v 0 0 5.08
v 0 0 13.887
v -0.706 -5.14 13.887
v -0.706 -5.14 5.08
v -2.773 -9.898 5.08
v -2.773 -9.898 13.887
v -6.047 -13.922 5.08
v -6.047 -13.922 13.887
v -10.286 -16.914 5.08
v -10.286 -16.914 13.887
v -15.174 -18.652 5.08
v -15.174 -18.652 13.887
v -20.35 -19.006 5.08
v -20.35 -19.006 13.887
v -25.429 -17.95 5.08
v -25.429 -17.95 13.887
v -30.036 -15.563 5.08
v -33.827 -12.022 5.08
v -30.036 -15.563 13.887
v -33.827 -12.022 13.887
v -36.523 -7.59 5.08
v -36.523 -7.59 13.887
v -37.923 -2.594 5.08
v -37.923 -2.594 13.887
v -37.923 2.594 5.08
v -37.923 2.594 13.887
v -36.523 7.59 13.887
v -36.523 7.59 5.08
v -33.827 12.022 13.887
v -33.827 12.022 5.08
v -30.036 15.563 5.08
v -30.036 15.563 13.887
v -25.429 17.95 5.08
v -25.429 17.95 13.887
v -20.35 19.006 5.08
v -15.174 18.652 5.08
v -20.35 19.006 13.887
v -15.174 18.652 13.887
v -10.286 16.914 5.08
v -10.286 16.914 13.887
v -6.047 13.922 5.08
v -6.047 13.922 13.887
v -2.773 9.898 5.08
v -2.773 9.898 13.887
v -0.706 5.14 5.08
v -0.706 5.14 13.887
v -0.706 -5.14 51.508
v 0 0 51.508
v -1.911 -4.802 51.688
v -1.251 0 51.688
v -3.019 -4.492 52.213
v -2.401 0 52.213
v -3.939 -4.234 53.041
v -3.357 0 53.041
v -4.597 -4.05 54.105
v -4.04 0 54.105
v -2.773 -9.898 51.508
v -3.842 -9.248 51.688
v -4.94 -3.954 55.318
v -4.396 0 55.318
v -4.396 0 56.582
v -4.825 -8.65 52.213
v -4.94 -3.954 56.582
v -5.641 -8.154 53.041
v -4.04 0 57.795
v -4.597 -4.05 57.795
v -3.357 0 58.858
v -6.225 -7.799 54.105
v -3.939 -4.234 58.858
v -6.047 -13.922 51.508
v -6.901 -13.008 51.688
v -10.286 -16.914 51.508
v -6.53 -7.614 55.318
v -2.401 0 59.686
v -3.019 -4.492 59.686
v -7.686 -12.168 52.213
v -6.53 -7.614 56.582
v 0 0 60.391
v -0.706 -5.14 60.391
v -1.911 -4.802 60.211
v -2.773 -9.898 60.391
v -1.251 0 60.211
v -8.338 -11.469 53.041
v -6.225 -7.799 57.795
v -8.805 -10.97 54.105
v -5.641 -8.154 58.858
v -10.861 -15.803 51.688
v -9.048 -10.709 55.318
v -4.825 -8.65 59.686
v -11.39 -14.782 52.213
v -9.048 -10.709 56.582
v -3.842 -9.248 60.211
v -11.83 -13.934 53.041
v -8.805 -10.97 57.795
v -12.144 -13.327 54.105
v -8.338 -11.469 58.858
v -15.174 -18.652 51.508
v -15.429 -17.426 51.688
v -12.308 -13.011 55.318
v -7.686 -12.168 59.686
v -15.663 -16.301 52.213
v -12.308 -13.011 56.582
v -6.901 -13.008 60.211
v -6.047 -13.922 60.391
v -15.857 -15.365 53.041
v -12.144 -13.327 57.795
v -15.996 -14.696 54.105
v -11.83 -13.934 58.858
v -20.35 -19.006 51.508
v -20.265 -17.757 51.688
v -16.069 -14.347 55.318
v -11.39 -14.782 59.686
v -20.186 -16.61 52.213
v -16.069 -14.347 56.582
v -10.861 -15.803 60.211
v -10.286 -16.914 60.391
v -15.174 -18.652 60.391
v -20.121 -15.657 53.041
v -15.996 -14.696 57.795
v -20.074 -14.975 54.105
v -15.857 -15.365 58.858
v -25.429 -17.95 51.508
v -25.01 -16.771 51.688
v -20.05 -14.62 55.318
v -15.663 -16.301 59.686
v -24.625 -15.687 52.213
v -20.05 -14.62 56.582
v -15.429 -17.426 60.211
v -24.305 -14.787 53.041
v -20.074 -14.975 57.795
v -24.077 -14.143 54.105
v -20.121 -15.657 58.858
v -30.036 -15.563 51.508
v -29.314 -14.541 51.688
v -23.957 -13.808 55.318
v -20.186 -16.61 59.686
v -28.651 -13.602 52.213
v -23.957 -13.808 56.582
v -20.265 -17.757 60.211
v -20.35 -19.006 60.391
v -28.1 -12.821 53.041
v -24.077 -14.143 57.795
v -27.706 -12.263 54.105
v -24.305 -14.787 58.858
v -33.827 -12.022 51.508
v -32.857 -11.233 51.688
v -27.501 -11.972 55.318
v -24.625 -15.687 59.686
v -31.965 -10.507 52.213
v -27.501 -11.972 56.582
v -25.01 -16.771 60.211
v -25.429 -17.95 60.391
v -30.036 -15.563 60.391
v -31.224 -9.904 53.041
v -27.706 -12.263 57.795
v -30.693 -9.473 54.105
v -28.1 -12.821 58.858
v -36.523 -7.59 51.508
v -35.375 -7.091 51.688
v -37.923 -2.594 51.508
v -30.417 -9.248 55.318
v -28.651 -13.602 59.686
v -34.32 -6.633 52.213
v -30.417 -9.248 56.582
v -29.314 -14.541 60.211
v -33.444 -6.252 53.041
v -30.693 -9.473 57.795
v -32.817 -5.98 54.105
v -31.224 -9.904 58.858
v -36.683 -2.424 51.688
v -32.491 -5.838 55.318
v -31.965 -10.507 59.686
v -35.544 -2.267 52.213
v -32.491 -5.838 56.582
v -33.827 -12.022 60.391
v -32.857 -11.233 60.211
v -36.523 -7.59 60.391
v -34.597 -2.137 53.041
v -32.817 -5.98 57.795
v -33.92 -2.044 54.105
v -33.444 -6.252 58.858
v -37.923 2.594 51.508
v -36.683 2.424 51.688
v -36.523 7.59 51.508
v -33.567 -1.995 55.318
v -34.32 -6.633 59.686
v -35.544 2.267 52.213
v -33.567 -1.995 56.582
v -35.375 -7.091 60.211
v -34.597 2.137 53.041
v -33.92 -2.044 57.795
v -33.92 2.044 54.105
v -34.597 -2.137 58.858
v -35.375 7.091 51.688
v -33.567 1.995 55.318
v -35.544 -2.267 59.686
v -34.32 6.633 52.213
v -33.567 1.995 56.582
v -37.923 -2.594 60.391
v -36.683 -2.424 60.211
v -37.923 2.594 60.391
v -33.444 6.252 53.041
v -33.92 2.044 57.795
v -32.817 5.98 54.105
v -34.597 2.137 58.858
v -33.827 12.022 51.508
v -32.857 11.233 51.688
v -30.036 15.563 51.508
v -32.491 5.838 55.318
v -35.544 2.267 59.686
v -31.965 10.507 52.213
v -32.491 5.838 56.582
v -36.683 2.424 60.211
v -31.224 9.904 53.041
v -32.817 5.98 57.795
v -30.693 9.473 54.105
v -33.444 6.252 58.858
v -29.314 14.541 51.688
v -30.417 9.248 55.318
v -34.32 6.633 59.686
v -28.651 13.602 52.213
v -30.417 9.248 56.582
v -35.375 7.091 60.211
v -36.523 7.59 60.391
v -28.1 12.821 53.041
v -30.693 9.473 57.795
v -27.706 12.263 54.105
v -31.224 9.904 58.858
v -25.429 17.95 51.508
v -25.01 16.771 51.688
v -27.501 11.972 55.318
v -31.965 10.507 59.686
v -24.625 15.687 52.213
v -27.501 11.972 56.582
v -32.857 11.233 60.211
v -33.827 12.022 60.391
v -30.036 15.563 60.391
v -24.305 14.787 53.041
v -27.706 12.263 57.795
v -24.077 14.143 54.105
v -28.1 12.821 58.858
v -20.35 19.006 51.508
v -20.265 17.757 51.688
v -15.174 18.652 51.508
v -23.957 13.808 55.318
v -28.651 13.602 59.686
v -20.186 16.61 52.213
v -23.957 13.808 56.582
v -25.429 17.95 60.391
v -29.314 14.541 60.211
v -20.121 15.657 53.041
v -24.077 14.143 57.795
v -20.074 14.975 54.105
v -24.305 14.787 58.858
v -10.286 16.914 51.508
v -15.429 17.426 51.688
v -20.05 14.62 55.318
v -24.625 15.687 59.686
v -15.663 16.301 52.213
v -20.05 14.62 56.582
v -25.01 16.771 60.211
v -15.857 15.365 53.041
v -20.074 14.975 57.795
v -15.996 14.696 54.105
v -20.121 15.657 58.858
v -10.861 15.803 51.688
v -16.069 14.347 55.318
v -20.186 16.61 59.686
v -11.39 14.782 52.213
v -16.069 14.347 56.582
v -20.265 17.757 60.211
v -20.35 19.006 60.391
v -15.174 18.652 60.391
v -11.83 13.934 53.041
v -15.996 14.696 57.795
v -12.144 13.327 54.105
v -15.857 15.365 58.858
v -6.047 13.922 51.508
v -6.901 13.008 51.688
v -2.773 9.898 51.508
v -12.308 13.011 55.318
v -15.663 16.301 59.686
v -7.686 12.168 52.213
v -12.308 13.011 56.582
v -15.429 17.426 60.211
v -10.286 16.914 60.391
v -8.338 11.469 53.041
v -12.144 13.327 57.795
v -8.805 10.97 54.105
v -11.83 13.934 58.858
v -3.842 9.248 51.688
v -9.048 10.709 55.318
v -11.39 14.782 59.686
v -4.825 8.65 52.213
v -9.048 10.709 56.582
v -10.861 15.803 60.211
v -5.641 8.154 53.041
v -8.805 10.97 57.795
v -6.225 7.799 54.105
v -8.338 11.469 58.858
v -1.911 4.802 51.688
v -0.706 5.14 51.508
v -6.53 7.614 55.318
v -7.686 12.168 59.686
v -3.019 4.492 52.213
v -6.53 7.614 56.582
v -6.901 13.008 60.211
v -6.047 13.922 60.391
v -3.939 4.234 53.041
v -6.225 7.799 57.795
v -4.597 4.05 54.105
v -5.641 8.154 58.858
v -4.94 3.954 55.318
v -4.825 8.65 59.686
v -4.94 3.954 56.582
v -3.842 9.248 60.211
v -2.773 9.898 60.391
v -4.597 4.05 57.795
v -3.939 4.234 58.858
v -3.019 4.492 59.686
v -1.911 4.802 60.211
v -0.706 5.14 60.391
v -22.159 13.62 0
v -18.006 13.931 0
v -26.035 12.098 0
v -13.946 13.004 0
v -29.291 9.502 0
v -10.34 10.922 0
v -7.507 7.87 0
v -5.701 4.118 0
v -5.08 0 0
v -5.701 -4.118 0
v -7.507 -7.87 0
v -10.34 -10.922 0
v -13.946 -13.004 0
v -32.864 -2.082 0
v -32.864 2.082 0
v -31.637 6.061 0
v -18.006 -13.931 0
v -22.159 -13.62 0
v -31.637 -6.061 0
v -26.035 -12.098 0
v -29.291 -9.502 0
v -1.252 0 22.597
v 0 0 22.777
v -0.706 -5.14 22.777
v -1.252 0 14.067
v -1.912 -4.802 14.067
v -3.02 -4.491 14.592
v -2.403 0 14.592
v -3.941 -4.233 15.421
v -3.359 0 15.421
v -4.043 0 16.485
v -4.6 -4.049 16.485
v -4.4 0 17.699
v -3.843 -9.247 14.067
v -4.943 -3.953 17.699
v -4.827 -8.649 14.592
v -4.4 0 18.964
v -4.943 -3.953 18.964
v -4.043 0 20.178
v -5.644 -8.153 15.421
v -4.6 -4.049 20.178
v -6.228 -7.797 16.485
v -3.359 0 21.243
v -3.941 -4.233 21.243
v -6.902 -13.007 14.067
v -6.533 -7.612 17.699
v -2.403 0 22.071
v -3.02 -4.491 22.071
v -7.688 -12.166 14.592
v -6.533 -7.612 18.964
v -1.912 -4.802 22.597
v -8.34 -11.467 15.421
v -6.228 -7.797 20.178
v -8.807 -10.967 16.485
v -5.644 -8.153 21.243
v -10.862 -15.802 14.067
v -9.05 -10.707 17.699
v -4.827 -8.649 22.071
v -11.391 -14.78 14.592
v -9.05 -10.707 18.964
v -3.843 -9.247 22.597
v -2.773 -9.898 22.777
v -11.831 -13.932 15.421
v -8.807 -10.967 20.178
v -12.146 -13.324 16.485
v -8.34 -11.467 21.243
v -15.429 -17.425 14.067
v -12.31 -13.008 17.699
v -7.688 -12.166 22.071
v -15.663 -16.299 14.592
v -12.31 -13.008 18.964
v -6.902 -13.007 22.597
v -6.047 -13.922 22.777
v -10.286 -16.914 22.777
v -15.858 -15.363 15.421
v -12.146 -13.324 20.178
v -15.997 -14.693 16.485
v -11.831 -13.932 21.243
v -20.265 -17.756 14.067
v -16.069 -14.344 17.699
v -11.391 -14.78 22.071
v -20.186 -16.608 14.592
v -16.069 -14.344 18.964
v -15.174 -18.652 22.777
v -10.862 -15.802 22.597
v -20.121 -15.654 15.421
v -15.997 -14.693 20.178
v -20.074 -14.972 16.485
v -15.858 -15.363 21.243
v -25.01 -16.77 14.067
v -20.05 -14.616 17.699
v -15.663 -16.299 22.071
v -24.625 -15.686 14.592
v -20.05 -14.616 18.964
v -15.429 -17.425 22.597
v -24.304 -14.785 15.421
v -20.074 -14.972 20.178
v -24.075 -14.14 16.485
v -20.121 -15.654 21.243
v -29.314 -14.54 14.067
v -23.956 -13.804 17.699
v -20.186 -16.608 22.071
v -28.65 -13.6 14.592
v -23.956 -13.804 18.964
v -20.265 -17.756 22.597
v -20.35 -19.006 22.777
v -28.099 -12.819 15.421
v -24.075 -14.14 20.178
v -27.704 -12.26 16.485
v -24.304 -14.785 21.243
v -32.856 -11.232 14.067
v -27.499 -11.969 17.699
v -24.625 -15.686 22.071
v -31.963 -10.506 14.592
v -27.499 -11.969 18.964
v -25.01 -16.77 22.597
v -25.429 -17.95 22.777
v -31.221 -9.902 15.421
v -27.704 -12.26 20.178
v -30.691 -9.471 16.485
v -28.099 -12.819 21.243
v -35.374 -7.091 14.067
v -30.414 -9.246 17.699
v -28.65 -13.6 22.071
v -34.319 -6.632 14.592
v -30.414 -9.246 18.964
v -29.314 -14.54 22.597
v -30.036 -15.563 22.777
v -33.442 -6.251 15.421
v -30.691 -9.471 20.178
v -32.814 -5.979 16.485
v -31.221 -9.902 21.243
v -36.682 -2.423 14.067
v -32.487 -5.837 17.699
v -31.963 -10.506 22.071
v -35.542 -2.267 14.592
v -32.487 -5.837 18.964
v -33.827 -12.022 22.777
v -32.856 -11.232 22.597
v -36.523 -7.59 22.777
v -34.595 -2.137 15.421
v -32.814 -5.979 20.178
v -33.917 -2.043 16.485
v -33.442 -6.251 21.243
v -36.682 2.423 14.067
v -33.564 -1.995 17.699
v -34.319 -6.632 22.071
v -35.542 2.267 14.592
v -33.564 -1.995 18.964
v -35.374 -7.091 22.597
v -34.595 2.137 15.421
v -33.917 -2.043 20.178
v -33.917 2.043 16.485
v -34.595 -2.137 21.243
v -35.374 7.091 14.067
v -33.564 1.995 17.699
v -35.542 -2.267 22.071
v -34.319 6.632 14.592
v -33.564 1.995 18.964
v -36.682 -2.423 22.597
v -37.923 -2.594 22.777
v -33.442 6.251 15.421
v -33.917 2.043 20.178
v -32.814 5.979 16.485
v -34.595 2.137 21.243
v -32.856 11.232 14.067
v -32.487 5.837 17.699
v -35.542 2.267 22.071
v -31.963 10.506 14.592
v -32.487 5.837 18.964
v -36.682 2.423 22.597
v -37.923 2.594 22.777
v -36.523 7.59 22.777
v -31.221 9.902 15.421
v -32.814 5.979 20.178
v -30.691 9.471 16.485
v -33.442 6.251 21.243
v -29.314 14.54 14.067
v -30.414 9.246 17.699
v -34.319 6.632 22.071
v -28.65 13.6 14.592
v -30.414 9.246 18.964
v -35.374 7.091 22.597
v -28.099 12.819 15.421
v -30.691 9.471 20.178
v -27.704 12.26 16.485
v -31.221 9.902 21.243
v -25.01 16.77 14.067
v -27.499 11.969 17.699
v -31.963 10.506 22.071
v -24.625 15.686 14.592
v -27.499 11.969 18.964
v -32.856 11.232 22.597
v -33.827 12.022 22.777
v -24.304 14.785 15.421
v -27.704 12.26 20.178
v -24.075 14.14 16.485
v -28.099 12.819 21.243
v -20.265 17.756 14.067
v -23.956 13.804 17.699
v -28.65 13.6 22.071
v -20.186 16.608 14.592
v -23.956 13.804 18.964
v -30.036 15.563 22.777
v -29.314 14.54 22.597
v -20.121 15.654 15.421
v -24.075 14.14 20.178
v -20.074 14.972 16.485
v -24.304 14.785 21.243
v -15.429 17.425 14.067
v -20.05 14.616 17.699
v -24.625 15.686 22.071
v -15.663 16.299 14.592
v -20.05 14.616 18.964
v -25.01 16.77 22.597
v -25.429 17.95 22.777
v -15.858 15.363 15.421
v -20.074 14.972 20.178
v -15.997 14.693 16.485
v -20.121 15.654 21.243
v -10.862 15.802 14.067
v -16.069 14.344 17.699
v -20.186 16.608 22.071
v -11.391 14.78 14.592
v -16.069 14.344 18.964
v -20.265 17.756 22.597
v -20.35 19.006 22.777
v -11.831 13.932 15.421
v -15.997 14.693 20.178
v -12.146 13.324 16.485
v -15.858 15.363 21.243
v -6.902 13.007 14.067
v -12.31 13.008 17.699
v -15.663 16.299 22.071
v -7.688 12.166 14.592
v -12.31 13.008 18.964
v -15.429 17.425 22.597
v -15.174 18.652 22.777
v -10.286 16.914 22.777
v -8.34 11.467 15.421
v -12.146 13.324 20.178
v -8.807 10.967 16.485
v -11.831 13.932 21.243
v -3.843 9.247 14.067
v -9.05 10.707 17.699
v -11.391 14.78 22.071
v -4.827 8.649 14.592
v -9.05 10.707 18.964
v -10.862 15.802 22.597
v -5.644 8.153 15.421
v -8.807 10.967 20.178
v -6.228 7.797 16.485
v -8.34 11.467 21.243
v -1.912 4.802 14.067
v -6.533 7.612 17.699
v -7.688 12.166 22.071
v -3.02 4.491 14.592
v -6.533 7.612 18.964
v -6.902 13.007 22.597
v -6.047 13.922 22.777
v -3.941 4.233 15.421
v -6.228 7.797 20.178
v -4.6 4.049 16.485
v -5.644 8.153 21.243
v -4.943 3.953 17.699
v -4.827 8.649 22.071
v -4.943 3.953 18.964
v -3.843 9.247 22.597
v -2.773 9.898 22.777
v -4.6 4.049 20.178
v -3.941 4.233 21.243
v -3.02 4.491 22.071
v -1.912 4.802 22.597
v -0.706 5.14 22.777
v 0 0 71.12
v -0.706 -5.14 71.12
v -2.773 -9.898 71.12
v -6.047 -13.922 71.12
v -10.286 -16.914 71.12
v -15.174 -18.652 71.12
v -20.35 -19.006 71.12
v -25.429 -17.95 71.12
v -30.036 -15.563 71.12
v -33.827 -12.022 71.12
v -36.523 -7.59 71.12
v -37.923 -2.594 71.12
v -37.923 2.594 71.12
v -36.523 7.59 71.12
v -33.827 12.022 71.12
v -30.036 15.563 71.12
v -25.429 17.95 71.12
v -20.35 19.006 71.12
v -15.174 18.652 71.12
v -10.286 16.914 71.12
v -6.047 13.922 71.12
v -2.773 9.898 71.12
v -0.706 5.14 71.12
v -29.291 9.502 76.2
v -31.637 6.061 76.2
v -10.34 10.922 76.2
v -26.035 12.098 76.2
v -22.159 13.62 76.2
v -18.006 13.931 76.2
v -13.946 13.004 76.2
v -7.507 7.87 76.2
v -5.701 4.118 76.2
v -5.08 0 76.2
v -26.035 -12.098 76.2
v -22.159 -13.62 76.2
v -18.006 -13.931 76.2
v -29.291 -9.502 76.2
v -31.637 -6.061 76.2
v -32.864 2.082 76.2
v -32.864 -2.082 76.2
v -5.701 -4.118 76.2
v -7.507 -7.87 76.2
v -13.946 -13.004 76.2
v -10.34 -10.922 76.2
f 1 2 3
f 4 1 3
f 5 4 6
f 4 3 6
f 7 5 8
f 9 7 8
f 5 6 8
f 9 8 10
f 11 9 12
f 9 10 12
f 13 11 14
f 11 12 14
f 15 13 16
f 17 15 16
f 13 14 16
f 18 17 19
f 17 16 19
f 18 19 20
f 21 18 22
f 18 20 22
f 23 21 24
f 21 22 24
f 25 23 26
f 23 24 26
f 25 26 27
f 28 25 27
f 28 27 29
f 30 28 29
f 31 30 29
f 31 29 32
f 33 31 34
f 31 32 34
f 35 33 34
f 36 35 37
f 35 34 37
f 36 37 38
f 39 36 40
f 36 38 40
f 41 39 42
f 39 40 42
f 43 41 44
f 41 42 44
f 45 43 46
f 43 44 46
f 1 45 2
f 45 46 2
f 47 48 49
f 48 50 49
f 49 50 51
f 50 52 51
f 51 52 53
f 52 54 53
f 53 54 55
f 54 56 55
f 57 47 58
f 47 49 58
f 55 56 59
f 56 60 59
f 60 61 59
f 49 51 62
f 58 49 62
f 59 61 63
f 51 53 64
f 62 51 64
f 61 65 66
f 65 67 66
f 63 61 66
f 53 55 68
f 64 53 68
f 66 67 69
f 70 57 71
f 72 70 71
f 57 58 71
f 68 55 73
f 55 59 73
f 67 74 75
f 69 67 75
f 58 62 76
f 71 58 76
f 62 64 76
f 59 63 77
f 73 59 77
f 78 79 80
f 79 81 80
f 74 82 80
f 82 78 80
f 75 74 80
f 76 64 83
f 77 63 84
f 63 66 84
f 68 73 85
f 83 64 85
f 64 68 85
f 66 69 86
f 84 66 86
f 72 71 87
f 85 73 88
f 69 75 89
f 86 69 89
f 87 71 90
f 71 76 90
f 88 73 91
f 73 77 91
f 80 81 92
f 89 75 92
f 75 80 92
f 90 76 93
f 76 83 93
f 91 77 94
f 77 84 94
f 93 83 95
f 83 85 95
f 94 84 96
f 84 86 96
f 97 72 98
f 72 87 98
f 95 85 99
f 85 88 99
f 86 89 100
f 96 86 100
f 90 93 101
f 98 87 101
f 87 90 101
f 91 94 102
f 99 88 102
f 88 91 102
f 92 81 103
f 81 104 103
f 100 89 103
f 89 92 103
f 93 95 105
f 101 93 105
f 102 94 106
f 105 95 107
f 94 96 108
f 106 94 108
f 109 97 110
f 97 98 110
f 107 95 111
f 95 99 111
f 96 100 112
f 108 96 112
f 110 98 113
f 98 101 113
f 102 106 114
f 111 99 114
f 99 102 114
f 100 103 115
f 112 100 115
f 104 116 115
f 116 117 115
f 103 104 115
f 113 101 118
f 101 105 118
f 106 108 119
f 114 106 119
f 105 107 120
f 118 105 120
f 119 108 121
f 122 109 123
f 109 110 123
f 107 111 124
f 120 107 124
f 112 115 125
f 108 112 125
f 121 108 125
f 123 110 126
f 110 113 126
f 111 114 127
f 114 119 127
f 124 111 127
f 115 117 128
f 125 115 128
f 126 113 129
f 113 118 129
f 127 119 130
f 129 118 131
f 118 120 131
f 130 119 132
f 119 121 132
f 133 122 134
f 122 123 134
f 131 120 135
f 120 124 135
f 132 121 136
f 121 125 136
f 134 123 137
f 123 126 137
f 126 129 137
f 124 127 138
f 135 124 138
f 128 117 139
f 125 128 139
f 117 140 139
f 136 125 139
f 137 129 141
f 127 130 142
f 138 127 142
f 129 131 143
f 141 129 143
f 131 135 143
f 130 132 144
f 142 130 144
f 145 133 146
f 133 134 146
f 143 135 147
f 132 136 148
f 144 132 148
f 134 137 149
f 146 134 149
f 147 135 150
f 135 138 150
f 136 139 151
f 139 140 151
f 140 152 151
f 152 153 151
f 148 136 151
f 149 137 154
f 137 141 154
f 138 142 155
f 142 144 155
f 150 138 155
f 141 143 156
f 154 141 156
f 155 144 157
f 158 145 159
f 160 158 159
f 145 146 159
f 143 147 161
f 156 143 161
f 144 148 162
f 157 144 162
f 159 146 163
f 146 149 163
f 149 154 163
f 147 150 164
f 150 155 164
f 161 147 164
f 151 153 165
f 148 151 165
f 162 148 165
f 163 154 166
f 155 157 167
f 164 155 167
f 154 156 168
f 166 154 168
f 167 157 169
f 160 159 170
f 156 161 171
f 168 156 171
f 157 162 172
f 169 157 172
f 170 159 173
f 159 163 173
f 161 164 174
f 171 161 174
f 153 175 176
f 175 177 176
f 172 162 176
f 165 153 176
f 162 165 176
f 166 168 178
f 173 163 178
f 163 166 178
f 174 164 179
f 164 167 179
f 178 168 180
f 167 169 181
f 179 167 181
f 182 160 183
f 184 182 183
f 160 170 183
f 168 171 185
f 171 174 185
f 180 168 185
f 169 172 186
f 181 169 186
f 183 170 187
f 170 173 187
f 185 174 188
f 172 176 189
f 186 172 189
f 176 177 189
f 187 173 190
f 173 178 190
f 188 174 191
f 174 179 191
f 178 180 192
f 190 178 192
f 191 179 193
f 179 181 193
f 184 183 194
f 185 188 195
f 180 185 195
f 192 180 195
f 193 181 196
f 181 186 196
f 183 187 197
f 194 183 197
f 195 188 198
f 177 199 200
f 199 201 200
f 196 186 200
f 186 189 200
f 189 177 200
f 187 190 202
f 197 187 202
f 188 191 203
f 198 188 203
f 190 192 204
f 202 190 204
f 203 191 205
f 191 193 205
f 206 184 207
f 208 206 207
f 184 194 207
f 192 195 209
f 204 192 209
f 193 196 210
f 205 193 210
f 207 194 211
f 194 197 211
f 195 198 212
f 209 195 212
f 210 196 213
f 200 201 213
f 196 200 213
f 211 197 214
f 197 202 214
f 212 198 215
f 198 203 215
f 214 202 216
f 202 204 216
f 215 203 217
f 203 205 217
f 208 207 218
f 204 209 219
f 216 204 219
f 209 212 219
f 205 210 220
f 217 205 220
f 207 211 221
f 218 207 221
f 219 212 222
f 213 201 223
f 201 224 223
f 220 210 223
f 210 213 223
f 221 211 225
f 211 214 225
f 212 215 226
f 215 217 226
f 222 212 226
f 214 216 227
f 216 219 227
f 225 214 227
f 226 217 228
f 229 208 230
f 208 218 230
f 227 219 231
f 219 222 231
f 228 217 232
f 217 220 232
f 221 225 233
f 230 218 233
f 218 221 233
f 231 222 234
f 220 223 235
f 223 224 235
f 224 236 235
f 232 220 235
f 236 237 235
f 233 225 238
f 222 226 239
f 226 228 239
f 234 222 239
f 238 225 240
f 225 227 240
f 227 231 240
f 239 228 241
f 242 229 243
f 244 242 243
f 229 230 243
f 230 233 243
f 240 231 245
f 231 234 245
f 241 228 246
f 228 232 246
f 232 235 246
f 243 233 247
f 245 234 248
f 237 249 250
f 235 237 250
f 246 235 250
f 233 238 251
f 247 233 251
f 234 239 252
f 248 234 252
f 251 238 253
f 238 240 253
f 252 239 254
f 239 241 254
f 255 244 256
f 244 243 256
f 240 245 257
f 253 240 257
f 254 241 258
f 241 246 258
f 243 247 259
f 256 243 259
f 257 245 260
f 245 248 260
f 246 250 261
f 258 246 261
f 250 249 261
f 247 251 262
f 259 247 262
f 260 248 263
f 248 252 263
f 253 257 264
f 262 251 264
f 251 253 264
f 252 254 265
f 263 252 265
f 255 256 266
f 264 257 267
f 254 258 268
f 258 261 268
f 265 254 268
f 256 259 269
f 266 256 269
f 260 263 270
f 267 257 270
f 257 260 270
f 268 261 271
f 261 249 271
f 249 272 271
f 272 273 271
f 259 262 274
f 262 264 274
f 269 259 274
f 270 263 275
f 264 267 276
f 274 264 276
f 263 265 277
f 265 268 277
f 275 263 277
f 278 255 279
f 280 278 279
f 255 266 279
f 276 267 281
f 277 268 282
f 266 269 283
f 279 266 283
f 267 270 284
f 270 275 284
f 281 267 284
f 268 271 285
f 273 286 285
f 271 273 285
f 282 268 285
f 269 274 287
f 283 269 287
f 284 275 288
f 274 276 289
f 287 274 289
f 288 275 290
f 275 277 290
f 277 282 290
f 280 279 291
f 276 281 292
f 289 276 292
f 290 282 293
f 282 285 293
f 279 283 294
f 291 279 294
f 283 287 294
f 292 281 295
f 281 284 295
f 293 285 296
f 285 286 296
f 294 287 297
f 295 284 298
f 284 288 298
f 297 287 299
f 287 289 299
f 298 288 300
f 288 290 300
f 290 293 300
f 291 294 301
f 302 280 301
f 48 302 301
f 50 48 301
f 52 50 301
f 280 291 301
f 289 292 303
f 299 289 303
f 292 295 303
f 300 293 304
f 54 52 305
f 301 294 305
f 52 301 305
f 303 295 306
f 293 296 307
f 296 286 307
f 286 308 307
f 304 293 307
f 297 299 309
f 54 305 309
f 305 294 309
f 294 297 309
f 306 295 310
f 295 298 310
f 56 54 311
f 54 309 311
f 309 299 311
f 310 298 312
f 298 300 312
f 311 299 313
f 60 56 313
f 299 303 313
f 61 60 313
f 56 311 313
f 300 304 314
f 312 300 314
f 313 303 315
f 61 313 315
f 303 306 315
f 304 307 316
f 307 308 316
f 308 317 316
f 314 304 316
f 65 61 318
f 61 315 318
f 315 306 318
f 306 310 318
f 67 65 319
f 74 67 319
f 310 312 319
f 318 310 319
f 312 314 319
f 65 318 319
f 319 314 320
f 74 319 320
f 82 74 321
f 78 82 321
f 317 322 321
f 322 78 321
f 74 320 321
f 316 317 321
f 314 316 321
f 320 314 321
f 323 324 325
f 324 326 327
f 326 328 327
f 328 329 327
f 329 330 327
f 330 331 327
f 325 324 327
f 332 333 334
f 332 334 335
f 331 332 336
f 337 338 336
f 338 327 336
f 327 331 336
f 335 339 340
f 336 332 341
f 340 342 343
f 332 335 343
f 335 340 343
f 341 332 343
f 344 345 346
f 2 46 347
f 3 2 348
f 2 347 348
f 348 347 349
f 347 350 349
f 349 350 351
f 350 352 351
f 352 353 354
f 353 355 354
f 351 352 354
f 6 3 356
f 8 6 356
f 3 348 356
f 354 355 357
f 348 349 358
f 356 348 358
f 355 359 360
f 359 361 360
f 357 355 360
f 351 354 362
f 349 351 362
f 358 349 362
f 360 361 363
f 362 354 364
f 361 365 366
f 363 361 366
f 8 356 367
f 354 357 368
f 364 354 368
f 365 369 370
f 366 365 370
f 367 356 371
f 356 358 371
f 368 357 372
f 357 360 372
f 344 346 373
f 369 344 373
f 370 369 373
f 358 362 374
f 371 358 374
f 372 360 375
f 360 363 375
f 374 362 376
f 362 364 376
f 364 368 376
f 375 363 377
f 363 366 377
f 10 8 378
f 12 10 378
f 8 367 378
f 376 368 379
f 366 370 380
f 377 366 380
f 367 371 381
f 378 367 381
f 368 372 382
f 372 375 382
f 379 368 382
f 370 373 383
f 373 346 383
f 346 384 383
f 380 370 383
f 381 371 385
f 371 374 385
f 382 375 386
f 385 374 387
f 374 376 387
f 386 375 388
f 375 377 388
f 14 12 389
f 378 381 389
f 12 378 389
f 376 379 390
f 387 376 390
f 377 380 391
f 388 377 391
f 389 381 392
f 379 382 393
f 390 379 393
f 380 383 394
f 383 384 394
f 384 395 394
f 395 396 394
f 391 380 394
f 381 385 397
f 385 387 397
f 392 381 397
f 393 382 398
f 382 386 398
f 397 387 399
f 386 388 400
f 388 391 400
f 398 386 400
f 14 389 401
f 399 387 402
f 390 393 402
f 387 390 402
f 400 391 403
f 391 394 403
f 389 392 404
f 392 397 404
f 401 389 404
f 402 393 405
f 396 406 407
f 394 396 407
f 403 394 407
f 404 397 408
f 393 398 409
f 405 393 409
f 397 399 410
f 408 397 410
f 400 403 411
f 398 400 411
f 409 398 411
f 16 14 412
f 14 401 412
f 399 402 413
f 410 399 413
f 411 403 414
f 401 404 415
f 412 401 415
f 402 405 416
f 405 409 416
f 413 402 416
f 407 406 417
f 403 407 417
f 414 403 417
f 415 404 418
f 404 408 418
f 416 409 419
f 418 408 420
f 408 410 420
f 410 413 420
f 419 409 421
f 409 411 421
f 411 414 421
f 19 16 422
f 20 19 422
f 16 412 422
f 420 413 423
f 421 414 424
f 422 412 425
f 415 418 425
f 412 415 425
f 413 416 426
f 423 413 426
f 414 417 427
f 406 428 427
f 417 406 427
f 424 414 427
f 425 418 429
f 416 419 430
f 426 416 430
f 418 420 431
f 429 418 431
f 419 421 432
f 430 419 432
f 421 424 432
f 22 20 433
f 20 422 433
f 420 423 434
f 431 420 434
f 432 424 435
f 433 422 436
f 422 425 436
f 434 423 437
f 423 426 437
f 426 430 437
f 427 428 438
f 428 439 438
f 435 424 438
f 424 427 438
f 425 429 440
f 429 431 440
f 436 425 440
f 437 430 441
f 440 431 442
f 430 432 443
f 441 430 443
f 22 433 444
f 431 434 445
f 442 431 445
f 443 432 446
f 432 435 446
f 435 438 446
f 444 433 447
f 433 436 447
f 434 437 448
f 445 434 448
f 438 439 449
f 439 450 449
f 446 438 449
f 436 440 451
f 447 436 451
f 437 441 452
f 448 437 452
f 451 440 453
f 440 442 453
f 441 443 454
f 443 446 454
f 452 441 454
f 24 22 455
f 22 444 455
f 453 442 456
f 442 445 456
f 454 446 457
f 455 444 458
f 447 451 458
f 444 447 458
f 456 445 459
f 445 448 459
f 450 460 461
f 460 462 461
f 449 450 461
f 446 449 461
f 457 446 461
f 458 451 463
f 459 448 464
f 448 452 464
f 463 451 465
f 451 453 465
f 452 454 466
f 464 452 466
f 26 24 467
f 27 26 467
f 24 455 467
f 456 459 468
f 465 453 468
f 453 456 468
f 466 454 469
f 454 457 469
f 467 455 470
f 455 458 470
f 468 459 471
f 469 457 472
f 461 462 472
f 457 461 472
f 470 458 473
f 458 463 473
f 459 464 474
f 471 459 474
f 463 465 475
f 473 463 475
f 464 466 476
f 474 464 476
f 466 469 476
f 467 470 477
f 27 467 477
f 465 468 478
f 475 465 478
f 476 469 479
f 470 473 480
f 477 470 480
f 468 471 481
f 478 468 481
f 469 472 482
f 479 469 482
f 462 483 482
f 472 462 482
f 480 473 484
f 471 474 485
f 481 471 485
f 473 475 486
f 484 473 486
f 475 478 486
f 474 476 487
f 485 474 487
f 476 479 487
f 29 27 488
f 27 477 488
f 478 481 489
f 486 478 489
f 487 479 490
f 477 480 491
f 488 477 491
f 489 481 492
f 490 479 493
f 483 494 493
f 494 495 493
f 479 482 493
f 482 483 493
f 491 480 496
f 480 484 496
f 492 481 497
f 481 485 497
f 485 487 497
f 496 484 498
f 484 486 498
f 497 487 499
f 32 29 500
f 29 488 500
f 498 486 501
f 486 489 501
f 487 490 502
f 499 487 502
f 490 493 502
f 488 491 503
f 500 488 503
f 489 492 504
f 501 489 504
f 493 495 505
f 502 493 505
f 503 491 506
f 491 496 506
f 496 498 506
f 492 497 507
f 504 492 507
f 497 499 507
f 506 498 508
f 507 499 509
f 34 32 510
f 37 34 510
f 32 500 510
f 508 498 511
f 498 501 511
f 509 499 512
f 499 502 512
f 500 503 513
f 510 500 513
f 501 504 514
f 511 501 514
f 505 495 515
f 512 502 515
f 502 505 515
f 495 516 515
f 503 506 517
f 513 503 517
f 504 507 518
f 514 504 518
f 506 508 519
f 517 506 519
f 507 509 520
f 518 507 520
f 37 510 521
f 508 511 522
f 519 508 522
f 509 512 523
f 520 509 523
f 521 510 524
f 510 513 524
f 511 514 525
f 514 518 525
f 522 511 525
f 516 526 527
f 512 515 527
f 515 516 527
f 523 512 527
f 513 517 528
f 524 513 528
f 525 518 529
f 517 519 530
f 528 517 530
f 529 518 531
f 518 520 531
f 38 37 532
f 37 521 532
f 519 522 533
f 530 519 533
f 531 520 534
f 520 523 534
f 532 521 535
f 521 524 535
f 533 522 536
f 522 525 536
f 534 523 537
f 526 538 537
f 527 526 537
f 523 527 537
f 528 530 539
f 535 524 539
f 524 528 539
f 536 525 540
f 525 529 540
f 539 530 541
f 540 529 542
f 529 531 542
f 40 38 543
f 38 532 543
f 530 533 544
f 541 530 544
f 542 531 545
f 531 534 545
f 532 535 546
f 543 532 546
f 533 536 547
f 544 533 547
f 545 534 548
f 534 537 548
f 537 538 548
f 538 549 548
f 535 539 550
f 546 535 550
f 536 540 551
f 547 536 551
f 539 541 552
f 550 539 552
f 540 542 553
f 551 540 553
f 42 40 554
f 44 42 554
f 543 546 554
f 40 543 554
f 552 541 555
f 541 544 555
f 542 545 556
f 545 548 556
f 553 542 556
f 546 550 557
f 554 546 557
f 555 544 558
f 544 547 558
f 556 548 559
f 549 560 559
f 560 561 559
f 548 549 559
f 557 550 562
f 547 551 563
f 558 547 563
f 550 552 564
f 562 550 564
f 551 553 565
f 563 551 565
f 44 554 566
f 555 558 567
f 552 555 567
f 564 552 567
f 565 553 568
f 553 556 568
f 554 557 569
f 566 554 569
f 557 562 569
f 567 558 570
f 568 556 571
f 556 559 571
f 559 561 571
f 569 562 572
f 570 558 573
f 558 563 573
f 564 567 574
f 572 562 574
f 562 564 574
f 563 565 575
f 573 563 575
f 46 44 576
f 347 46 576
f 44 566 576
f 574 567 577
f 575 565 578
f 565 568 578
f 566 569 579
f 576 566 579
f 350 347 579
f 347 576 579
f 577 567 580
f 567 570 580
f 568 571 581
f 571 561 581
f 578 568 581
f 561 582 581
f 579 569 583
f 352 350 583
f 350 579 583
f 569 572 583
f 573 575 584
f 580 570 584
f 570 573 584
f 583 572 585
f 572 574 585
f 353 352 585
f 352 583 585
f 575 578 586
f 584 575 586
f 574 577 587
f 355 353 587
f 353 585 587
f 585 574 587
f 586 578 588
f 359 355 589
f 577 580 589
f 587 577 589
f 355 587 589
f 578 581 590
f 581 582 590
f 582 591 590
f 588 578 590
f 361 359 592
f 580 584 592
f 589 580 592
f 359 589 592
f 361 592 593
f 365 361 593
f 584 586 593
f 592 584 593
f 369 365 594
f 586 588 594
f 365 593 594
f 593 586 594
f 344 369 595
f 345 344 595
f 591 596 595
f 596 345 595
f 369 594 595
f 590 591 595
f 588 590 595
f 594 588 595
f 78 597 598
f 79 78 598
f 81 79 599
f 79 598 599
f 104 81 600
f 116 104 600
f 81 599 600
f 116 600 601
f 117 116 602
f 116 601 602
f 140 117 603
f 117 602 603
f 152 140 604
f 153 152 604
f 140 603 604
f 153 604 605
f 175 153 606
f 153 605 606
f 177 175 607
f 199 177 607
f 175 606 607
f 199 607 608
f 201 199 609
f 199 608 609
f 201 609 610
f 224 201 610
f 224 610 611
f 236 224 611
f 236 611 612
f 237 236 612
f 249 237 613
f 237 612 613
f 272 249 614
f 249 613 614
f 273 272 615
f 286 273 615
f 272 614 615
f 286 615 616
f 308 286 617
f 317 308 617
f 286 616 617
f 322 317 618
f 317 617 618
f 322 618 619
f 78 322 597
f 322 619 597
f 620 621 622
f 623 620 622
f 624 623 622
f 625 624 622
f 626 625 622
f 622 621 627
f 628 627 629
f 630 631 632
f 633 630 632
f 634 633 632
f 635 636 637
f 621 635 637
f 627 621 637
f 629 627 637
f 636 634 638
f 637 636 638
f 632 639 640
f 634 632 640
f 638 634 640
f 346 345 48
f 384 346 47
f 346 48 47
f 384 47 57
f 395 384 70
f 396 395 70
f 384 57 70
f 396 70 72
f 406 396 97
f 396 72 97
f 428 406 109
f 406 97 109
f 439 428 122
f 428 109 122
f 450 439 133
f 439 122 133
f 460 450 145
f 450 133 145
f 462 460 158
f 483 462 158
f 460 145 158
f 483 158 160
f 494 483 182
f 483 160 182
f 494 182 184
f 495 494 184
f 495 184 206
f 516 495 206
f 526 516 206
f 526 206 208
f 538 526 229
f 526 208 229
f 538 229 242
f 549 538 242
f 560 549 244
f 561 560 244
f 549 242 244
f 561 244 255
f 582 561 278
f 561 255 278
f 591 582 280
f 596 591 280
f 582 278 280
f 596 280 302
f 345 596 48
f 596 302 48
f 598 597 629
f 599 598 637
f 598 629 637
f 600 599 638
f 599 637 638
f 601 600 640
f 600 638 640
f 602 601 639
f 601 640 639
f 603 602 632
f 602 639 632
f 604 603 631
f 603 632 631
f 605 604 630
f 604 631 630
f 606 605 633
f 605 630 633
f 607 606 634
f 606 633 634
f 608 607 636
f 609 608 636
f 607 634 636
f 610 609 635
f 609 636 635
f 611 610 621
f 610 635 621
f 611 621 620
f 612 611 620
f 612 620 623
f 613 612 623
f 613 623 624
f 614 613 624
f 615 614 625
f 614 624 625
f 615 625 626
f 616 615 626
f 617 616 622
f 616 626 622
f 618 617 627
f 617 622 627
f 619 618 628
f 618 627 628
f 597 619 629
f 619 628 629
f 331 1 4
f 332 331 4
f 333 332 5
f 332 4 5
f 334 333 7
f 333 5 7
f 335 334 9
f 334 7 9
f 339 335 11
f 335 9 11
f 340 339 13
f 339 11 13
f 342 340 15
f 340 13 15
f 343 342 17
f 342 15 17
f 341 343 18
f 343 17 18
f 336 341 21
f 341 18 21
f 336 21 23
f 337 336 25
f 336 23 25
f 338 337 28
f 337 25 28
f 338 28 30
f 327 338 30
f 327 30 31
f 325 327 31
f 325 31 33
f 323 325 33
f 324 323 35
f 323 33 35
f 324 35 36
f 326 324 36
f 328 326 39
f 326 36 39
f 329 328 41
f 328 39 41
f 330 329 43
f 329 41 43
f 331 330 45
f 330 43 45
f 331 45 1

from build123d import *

# Parameters (mm, degrees)
F2_SIZE = 5.08


with BuildPart() as f1:
    # F0 (on Front) → F1 (revolve)
    with BuildSketch(Plane.XZ):
        with BuildLine():
            Line((-19.05, 0), (0, 0))
            Line((0, 0), (0, 13.886647))
            ThreePointArc((0, 13.886647), (-4.445, 18.331647), (0, 22.776647))
            Line((0, 22.776647), (0, 51.508222))
            ThreePointArc((0, 51.508222), (-4.441492, 55.949714), (0, 60.391206))
            Line((0, 60.391206), (0, 76.2))
            Line((0, 76.2), (-19.05, 76.2))
            Line((-19.05, 76.2), (-19.05, 0))
        make_face()
    revolve(axis=Axis((-19.05, 0, 38.1), (0, 0, -1)))

    # F2
    f2_edges = [f1.edges().sort_by_distance(p)[0] for p in [
        (-38.1, 0, 76.2),
        (-38.1, 0, 0),
    ]]
    chamfer(f2_edges, length=F2_SIZE)


solid = f1.part
